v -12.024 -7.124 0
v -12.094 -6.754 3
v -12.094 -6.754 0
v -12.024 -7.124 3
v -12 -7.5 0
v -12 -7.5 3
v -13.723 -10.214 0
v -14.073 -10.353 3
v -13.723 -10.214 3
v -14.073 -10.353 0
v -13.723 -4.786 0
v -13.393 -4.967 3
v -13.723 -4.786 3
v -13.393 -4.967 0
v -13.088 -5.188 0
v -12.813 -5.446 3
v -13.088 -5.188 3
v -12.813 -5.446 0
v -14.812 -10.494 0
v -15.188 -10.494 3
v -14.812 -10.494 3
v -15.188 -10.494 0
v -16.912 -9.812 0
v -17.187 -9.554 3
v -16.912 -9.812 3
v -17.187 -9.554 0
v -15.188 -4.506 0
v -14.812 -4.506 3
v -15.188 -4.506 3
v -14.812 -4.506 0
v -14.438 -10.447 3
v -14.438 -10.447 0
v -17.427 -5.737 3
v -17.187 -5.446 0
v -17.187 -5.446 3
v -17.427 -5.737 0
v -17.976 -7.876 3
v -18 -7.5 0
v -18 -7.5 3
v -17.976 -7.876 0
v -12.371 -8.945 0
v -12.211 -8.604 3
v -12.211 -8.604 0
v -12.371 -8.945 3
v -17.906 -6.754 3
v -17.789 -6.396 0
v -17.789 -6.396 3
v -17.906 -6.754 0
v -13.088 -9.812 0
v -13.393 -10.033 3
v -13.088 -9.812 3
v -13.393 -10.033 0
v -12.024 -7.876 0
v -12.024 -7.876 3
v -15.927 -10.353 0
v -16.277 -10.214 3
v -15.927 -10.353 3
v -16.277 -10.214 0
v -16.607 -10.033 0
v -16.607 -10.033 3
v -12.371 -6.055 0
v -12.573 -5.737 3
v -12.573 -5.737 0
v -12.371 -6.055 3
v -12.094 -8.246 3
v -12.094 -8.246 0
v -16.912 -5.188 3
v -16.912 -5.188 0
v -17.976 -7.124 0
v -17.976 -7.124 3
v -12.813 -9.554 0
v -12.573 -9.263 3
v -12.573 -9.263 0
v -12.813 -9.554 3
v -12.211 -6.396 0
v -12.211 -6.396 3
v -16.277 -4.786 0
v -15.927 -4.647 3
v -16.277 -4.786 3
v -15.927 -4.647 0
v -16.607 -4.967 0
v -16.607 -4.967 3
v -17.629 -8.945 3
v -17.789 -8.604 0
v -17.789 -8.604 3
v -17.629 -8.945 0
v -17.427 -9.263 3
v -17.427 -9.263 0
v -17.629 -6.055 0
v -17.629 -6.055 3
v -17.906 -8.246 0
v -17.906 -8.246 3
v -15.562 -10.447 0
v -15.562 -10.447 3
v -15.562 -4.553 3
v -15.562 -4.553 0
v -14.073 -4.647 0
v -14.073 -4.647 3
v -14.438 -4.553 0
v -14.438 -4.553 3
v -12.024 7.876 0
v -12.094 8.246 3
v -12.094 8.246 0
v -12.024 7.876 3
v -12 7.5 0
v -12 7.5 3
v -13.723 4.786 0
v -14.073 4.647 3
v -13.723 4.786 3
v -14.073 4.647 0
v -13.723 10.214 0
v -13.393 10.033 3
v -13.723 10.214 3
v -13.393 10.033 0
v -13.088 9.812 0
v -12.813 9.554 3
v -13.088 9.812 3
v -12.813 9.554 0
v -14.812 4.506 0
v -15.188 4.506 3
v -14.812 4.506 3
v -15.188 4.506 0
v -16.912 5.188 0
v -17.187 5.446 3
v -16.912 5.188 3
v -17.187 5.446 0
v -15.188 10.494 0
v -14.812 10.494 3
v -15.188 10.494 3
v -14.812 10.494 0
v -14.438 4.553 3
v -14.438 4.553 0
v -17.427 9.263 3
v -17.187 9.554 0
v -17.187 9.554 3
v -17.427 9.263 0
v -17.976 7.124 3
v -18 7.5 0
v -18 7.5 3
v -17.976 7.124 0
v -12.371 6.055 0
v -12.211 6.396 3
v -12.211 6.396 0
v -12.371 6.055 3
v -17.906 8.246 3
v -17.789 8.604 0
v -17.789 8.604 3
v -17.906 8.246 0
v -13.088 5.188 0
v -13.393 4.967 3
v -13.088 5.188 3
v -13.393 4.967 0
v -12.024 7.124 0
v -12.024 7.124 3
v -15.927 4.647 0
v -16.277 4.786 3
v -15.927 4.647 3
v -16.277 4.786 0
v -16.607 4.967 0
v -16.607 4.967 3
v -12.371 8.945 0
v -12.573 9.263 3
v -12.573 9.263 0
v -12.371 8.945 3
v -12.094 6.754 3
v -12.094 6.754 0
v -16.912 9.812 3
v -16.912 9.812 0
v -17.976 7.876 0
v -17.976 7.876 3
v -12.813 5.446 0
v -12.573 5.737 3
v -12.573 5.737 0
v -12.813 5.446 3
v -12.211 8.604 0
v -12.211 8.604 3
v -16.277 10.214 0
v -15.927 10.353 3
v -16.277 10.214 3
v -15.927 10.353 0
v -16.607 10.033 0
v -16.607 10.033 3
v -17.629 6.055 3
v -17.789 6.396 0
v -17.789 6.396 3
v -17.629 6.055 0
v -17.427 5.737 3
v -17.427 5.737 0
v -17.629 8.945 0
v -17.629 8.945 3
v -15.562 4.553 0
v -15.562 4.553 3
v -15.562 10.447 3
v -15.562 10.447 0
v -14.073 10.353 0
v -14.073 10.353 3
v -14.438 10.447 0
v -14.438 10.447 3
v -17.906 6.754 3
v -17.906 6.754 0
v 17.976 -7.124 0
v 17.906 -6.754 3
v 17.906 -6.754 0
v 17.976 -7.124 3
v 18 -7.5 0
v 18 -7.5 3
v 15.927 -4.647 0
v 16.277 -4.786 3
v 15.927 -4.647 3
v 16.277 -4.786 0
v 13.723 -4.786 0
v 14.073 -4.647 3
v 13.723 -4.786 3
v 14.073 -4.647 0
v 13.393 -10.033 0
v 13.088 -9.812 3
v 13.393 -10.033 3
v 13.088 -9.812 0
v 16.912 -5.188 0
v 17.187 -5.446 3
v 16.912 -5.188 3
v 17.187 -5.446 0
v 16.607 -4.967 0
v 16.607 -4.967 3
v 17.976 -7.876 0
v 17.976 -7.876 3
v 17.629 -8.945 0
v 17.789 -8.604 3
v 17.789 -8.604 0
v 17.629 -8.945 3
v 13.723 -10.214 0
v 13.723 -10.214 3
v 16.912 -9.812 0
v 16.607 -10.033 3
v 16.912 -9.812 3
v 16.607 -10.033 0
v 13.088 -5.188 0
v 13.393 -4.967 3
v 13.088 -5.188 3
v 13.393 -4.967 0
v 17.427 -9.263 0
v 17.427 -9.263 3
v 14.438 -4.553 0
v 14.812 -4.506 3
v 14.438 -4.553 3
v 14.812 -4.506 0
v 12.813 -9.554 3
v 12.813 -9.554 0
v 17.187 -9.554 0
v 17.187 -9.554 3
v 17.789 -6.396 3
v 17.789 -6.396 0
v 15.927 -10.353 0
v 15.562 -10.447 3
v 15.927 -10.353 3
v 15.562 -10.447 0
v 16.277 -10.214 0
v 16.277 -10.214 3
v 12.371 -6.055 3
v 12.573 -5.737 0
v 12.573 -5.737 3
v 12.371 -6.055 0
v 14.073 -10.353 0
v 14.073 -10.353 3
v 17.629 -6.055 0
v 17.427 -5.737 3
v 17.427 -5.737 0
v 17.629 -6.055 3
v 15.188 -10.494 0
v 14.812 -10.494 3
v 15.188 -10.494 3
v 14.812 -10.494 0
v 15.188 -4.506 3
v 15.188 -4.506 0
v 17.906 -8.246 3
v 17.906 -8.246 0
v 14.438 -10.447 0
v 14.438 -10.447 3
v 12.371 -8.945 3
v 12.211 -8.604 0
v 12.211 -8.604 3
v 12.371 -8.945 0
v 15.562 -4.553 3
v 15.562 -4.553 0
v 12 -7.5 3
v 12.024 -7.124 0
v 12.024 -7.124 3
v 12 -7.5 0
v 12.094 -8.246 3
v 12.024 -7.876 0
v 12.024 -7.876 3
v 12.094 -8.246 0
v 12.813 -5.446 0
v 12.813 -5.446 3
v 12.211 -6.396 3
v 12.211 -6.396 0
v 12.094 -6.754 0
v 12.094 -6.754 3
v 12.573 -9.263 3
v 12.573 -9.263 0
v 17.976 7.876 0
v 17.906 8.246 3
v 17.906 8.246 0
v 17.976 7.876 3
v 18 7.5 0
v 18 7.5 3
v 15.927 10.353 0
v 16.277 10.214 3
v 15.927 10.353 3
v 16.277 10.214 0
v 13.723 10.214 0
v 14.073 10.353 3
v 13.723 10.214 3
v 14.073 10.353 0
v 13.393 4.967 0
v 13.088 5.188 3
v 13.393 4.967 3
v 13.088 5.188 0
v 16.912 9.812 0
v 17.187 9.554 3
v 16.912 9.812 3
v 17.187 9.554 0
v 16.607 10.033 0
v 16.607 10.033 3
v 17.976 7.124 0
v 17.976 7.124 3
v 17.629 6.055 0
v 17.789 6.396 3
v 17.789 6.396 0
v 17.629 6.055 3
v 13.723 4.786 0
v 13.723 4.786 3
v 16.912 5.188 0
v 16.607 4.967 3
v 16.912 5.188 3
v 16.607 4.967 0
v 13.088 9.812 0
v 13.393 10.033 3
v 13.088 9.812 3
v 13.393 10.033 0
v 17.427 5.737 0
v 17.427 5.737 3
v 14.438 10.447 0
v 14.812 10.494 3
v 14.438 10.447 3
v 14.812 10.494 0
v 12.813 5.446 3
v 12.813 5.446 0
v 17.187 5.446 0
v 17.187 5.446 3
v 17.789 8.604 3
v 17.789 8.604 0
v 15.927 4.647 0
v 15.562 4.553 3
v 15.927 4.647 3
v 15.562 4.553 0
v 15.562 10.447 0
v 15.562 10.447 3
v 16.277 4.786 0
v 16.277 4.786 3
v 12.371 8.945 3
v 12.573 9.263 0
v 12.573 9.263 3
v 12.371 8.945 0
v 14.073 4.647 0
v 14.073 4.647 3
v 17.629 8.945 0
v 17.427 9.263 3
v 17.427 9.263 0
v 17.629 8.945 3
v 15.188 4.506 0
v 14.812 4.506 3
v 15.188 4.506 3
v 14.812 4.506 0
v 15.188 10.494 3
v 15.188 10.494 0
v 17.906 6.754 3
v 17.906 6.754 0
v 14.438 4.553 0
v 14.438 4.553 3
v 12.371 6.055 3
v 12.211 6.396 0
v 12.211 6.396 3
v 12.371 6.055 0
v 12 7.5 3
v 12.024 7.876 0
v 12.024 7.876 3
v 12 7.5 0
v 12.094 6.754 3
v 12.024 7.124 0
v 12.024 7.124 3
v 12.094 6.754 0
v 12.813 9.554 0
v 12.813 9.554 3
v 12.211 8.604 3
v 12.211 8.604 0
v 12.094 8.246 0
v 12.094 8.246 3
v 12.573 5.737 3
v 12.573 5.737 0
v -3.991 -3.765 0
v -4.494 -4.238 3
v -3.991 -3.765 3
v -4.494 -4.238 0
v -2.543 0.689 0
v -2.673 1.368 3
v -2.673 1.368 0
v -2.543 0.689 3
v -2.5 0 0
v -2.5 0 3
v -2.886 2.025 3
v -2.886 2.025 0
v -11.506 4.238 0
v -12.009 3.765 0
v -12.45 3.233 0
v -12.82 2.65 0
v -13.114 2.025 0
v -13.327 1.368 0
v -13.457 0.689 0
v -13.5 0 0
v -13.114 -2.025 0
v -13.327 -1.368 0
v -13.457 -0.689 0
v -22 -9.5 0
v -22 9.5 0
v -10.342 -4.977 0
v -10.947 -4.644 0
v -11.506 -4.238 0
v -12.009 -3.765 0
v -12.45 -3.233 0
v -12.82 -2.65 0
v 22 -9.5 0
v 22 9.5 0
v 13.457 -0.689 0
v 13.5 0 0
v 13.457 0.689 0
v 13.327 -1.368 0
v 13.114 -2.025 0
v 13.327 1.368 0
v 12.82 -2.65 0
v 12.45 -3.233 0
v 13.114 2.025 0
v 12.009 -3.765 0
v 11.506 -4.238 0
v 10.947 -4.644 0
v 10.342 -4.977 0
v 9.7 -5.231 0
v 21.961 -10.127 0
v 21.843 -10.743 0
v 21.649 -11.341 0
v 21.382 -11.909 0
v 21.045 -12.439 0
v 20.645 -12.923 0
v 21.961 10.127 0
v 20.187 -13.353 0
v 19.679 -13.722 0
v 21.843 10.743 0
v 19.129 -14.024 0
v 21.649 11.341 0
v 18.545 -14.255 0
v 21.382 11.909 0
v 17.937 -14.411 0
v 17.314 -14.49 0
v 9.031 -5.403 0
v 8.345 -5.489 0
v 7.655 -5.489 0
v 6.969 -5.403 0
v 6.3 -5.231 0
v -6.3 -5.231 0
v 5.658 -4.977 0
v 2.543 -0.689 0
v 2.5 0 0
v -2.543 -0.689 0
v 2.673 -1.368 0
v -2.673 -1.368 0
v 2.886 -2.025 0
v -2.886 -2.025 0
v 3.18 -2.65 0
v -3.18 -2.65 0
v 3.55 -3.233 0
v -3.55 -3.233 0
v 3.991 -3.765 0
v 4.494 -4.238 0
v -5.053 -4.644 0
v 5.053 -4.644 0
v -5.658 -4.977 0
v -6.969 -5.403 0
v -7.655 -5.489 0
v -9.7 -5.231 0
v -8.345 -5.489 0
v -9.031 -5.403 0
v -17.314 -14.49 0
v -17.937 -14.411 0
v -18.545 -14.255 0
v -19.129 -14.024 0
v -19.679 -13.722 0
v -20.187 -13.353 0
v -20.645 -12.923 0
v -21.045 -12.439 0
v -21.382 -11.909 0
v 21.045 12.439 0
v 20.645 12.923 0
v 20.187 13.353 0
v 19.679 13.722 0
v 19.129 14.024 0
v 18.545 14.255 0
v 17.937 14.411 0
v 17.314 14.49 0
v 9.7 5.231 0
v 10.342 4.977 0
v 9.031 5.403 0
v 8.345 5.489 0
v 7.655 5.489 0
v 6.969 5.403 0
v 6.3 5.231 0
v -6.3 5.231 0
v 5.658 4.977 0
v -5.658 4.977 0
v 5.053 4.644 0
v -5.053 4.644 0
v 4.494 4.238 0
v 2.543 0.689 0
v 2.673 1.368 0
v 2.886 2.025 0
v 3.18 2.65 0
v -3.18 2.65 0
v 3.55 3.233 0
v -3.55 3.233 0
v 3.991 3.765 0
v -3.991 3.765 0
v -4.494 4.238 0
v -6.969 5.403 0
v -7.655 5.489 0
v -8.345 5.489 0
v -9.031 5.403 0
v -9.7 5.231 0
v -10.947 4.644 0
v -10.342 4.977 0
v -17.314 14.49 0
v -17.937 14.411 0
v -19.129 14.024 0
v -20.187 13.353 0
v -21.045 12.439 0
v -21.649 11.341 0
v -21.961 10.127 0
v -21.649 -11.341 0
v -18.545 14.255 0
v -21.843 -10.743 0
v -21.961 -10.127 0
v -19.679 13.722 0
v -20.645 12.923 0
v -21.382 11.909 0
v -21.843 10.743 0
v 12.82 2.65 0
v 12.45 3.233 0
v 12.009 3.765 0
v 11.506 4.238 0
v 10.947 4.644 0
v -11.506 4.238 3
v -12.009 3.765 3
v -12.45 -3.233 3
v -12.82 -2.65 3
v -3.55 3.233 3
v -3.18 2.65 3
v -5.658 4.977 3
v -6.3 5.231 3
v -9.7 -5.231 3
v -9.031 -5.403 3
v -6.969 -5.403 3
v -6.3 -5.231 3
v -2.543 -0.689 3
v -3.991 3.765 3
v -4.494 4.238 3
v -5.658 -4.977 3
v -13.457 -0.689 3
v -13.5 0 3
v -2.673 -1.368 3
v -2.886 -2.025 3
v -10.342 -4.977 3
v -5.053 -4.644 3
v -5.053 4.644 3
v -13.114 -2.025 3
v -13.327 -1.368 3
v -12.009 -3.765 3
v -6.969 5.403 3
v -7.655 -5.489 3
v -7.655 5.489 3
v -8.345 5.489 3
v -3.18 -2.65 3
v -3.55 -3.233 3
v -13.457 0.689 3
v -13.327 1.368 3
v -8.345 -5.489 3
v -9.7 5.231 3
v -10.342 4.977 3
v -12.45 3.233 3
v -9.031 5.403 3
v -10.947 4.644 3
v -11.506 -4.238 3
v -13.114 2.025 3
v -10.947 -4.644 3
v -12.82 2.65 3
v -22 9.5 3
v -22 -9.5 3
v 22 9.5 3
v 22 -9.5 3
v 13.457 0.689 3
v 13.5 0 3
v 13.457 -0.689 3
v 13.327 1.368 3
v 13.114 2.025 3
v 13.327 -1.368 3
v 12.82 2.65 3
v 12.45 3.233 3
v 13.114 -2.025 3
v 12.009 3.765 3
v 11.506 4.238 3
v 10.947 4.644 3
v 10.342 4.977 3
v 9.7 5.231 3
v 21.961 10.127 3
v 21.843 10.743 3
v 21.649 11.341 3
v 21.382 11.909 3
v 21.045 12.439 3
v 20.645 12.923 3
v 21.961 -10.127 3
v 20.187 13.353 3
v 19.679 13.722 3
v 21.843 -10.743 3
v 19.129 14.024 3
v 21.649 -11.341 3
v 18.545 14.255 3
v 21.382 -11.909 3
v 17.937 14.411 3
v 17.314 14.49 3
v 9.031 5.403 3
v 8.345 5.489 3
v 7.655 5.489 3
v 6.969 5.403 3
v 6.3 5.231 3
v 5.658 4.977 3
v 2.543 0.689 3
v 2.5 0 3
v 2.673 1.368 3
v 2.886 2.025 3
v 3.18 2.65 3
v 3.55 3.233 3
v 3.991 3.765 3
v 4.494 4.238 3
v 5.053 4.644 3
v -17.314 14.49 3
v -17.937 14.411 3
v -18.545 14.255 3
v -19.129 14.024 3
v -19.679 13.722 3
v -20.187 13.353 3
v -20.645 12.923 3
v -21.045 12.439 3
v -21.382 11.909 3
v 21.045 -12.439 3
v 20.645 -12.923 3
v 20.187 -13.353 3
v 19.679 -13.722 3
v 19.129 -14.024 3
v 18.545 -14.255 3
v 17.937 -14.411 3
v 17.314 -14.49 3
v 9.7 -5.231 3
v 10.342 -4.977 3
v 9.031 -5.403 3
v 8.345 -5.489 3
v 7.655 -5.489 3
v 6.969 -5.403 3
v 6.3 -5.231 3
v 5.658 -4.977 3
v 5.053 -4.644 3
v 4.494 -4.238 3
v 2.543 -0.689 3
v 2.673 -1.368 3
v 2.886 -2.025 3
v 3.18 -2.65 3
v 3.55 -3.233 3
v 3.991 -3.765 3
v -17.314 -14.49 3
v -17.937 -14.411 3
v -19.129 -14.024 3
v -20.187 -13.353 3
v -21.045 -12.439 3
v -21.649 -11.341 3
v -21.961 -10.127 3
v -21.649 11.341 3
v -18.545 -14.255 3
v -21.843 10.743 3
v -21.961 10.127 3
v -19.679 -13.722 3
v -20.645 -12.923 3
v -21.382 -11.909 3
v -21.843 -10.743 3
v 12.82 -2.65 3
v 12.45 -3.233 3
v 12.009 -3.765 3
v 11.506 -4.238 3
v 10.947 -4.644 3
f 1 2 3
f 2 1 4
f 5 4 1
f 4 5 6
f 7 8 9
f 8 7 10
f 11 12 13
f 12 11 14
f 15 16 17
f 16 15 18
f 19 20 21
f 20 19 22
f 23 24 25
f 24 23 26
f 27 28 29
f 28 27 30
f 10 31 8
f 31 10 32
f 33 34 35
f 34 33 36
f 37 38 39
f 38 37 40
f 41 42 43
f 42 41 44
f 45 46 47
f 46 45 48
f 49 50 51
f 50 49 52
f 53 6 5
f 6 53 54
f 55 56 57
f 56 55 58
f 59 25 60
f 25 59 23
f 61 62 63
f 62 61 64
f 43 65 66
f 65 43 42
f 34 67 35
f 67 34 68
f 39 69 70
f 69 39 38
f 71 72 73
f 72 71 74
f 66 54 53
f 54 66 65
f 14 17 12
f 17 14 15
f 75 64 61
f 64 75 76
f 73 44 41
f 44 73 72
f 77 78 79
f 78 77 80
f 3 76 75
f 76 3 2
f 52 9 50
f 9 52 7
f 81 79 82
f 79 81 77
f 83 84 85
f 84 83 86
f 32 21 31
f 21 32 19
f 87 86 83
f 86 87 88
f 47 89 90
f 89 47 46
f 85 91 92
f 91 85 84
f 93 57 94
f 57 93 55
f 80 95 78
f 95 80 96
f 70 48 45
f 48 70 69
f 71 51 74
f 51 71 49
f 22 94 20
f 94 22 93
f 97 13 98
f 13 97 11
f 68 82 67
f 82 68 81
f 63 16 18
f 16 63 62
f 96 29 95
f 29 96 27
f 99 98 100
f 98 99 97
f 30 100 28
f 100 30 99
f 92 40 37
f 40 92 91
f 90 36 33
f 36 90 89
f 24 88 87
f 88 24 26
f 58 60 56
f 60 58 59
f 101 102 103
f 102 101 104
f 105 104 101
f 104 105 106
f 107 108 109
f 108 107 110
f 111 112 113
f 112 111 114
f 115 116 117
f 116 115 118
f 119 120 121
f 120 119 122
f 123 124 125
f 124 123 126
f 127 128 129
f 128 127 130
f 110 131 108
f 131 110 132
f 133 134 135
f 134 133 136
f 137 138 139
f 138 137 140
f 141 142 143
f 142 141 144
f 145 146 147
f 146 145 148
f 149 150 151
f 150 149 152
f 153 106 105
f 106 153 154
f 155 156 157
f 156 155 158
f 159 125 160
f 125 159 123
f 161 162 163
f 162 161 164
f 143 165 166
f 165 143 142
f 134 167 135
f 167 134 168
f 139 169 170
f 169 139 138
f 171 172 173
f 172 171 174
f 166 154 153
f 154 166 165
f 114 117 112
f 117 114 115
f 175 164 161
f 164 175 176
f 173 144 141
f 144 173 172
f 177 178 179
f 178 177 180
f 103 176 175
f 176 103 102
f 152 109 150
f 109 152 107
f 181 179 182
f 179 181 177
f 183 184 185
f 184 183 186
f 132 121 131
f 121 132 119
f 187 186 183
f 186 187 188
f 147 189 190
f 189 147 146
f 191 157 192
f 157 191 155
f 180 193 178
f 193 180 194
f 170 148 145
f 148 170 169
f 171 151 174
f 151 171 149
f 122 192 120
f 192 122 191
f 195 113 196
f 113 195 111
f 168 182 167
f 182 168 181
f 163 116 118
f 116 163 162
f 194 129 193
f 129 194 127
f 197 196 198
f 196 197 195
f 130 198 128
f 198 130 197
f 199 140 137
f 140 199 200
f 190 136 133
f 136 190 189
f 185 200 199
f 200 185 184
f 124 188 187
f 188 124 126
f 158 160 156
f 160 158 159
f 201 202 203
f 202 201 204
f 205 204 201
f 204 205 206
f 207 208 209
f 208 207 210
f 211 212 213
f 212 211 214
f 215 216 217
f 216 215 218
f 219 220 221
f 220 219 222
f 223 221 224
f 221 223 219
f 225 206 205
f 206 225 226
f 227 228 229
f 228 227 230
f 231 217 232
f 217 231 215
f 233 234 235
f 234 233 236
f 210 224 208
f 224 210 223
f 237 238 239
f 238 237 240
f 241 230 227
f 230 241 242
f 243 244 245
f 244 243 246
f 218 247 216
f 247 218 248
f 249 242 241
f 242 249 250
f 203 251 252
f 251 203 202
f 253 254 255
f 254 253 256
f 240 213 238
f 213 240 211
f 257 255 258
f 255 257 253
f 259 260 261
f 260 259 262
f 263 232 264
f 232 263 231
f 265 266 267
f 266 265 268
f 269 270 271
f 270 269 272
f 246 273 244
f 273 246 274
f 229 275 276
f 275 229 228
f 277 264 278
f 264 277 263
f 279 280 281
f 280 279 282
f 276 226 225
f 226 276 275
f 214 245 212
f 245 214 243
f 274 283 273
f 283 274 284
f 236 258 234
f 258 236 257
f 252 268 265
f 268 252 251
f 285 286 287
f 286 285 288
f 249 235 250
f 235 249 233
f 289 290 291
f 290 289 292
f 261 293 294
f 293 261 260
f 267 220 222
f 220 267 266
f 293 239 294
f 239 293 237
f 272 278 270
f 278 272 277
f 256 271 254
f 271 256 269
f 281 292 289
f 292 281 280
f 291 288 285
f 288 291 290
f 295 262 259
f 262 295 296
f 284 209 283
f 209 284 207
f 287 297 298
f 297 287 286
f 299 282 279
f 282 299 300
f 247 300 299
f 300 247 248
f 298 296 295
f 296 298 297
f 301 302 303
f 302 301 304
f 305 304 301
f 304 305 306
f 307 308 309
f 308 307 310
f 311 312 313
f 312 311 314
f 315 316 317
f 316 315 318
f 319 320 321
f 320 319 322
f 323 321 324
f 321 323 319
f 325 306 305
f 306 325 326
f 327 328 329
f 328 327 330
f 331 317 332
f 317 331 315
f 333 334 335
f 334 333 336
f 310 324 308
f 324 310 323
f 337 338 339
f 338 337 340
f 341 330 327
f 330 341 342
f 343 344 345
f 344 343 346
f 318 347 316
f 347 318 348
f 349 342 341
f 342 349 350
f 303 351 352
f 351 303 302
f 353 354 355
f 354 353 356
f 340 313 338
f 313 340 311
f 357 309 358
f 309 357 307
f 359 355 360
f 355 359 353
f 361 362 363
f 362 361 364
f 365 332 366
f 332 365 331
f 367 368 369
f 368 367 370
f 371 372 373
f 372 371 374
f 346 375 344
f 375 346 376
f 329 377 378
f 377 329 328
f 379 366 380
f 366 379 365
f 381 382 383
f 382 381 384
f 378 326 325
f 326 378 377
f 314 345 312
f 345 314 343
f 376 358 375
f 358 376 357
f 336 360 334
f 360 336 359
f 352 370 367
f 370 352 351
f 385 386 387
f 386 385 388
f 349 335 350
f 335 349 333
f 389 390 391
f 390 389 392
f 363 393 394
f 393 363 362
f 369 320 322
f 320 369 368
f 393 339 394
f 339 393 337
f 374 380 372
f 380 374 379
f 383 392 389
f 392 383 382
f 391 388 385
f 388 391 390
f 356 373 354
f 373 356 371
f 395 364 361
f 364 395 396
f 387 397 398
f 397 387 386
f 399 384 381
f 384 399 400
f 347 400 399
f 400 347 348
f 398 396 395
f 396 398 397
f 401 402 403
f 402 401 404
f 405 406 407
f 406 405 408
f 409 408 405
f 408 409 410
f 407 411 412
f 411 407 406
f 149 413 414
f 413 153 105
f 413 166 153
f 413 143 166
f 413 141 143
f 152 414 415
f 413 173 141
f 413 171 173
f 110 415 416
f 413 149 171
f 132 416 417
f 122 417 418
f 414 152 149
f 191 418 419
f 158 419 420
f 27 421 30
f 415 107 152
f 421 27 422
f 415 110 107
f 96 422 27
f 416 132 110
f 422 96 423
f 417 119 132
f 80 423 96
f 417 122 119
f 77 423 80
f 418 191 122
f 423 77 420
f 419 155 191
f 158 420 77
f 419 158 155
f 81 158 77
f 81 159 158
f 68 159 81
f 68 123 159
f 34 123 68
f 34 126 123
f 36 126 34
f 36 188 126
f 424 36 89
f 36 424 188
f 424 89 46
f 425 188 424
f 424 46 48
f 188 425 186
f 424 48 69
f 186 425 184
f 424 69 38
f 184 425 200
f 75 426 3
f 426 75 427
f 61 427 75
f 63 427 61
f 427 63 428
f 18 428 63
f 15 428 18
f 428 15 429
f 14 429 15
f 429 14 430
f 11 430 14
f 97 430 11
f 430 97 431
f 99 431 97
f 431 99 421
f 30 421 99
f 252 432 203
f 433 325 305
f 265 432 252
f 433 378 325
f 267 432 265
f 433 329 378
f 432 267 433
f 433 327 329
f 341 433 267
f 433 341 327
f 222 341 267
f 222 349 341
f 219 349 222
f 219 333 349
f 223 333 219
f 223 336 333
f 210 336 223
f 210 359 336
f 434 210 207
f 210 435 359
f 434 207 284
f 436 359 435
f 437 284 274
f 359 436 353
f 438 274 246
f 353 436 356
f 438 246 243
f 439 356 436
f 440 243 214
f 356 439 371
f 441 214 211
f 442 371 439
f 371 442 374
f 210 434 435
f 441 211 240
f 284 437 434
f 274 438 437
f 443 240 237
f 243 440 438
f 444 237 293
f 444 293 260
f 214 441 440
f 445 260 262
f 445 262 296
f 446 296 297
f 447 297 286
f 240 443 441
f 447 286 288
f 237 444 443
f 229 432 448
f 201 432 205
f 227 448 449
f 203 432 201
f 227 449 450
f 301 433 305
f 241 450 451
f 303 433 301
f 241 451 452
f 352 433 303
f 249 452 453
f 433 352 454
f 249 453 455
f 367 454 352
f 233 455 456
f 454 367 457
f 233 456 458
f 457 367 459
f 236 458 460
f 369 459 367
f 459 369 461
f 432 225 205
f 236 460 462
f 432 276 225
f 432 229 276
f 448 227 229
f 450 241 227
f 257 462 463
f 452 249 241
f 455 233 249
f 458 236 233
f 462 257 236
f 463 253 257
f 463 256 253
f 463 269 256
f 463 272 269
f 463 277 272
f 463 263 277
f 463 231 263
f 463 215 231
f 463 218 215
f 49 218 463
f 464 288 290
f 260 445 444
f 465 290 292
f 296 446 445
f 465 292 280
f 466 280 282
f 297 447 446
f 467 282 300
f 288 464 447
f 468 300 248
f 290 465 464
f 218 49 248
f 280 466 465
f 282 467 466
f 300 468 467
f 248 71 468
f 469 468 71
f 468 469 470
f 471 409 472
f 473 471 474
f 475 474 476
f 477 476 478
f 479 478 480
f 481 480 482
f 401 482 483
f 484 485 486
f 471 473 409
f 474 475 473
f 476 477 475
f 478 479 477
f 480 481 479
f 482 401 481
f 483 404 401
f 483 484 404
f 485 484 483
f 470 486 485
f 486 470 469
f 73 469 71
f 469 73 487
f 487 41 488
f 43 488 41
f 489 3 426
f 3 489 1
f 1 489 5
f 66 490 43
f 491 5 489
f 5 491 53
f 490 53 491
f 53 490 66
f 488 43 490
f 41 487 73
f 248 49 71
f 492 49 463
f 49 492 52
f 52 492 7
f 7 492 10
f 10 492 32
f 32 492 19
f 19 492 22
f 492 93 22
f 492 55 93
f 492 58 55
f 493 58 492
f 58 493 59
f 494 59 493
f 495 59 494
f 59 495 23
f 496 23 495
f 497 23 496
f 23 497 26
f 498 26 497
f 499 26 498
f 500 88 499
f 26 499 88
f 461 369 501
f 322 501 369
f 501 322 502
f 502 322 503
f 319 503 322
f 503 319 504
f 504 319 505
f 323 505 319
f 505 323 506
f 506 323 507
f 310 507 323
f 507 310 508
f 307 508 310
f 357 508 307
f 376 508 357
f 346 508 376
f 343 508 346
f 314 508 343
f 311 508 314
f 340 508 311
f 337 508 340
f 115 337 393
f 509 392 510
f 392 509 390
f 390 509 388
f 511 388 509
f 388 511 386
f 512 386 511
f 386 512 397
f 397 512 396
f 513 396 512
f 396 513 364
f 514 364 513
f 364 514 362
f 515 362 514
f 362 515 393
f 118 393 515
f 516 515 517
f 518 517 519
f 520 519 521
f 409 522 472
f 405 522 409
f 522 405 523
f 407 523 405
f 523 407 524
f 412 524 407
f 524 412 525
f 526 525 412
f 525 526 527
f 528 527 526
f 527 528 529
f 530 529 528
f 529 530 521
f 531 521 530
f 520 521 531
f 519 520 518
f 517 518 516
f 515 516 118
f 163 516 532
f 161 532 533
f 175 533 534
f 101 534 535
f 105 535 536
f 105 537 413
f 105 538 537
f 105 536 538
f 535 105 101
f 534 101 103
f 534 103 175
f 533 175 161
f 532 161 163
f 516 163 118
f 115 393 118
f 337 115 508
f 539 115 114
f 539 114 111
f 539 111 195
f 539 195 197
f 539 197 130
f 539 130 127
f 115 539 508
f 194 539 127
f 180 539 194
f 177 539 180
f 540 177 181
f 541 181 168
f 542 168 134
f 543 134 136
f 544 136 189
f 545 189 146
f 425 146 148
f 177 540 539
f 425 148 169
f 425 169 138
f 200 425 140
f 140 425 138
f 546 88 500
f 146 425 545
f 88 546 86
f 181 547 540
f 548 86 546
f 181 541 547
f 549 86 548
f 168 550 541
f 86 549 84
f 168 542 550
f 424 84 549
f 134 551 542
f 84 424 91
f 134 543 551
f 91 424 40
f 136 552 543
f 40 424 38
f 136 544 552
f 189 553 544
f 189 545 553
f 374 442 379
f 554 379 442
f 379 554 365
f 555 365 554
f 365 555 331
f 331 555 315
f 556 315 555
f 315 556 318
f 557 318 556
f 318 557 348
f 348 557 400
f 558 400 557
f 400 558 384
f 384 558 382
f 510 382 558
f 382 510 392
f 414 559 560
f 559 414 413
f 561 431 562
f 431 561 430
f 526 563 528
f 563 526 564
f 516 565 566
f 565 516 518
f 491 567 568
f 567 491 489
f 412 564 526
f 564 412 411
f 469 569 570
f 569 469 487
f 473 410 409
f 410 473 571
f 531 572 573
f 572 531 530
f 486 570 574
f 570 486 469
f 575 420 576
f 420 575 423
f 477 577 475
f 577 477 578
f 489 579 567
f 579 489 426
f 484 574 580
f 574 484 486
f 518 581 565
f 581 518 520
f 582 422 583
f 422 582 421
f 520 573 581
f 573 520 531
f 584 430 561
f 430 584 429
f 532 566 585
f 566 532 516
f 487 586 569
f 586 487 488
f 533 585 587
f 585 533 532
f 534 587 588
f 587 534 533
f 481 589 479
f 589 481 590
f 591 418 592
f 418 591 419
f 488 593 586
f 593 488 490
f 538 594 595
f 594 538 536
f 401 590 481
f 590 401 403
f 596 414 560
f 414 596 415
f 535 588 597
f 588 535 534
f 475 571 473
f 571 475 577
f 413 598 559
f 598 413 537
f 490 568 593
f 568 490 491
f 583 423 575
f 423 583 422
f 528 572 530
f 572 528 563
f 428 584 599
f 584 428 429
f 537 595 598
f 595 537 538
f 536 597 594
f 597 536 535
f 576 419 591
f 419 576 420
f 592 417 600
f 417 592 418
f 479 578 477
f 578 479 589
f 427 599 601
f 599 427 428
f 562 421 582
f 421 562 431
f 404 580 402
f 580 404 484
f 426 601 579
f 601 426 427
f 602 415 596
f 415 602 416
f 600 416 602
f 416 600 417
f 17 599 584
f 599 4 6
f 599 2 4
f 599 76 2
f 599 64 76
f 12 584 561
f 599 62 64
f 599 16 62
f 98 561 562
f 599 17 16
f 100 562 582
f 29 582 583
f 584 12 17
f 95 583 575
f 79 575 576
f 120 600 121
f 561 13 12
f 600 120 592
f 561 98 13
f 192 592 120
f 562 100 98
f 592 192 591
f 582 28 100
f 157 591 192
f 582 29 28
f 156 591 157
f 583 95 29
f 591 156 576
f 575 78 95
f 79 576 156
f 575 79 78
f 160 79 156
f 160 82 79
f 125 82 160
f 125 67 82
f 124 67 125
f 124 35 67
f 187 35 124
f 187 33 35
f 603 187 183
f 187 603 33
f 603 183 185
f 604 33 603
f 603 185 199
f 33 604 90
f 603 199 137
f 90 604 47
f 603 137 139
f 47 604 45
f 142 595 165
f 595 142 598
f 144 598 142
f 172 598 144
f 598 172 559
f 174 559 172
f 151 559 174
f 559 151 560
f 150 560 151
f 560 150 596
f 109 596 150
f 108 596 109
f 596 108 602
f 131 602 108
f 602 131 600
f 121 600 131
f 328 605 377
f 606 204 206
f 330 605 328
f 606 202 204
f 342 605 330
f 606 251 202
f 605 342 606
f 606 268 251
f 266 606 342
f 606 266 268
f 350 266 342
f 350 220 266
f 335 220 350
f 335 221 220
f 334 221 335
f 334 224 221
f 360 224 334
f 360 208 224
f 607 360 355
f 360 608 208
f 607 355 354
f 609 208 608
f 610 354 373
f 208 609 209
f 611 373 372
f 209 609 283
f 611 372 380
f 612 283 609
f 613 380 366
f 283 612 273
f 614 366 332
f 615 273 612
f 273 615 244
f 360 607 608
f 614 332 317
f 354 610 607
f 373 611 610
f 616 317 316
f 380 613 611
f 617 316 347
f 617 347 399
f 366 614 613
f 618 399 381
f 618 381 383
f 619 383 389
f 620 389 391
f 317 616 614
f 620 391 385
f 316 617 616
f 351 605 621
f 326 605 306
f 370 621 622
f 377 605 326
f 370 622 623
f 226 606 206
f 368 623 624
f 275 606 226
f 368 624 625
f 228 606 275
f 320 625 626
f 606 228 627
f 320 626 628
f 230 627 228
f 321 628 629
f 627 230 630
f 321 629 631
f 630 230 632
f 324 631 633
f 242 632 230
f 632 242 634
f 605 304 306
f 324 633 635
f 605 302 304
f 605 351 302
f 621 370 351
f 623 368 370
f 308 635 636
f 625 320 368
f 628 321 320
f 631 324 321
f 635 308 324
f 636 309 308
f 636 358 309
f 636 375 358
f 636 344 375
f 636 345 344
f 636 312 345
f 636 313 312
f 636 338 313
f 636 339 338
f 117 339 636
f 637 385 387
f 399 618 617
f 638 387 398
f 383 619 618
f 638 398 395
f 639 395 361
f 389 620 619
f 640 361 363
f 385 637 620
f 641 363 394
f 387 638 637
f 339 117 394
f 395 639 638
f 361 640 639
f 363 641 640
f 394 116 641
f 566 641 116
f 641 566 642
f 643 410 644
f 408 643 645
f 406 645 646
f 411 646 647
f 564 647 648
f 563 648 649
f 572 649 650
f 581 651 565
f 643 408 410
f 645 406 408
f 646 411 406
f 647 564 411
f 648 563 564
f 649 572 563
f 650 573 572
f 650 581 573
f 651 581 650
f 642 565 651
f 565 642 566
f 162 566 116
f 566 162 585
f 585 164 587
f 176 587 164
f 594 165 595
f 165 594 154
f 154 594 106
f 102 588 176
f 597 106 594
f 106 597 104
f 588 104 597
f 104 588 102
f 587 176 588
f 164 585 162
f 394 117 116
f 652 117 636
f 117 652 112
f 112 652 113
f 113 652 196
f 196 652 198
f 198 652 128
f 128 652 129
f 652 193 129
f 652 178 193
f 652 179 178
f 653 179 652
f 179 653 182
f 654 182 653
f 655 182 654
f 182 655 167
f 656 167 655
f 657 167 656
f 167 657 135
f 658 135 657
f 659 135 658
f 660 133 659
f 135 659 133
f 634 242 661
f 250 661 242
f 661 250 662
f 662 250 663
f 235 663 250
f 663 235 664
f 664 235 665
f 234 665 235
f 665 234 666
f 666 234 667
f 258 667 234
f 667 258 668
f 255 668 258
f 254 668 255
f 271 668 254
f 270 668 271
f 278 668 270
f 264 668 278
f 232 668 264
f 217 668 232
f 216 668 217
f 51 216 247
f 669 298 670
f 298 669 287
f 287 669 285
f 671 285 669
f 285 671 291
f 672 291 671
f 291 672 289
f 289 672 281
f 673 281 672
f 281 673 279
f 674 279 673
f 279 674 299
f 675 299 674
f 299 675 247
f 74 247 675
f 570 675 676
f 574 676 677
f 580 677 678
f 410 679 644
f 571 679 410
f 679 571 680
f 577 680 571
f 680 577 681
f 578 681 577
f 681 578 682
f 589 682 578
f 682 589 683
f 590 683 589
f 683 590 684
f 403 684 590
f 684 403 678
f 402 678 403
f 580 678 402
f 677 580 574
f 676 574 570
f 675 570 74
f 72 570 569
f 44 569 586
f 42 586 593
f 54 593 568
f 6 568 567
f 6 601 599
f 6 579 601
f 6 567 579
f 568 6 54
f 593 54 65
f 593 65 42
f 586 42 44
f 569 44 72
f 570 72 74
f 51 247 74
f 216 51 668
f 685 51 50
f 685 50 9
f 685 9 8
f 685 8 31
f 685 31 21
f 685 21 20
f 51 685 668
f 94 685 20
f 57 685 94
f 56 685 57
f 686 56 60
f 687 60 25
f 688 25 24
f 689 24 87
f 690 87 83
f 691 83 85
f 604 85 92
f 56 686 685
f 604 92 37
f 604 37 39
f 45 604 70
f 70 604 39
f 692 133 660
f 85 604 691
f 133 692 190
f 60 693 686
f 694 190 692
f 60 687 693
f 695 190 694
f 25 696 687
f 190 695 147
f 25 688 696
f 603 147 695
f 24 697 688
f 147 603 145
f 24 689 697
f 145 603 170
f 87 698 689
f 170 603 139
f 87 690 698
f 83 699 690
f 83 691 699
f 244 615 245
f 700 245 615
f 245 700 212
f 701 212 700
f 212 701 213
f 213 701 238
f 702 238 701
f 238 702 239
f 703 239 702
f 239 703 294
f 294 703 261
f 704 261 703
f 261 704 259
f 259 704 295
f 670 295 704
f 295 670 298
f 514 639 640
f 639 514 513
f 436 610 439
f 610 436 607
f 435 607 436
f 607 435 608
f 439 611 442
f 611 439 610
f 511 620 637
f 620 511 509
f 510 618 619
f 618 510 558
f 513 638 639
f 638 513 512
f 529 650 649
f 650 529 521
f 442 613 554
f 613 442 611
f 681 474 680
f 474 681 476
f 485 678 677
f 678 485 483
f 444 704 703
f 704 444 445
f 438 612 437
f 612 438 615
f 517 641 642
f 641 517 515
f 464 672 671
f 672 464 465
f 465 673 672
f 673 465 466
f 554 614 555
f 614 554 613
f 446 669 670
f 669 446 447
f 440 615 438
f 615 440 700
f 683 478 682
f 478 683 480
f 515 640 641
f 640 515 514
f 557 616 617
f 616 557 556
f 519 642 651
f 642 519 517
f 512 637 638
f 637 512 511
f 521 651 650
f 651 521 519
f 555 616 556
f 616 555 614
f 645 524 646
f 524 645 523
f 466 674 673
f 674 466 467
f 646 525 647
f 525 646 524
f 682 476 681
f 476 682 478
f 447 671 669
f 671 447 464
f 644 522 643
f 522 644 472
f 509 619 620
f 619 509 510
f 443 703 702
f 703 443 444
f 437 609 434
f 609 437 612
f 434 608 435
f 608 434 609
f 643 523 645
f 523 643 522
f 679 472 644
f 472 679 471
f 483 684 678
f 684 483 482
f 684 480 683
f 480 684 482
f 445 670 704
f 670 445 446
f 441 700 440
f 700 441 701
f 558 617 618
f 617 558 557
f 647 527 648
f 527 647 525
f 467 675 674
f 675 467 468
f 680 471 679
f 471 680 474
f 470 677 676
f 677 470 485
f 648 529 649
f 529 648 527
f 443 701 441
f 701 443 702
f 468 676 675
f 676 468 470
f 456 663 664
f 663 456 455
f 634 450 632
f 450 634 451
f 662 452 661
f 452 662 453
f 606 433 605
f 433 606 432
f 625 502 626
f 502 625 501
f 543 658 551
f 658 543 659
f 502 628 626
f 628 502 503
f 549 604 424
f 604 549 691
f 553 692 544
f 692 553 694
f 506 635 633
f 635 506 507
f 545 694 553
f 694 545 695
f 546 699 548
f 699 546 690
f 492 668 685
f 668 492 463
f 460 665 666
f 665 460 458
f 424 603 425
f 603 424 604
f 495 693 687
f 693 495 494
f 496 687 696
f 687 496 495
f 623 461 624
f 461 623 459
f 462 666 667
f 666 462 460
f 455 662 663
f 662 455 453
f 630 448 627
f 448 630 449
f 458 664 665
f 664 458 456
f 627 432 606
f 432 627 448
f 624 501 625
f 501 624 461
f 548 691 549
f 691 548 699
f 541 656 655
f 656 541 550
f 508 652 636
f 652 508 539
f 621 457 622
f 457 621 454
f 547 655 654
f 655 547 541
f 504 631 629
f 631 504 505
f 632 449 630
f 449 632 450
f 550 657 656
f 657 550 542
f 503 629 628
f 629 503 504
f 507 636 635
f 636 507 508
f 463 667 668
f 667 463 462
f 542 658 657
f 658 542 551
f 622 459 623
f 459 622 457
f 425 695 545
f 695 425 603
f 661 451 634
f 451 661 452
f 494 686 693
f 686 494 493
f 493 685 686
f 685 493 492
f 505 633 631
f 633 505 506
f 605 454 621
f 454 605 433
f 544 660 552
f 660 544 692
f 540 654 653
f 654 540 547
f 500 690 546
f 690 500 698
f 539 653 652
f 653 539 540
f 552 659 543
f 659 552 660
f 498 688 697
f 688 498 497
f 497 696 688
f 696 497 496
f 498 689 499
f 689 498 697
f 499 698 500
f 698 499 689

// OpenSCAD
$fn = 50;


difference() {
	union() {
		hull() {
			translate(v = [-17.0000000000, 9.5000000000, 0]) {
				cylinder(h = 3, r = 5);
			}
			translate(v = [17.0000000000, 9.5000000000, 0]) {
				cylinder(h = 3, r = 5);
			}
			translate(v = [-17.0000000000, -9.5000000000, 0]) {
				cylinder(h = 3, r = 5);
			}
			translate(v = [17.0000000000, -9.5000000000, 0]) {
				cylinder(h = 3, r = 5);
			}
		}
	}
	union() {
		#translate(v = [-15.0000000000, -7.5000000000, -100.0000000000]) {
			cylinder(h = 200, r = 3.0000000000);
		}
		#translate(v = [-15.0000000000, 7.5000000000, -100.0000000000]) {
			cylinder(h = 200, r = 3.0000000000);
		}
		#translate(v = [15.0000000000, -7.5000000000, -100.0000000000]) {
			cylinder(h = 200, r = 3.0000000000);
		}
		#translate(v = [15.0000000000, 7.5000000000, -100.0000000000]) {
			cylinder(h = 200, r = 3.0000000000);
		}
		#translate(v = [-8.0000000000, 0, 0]) {
			cylinder(h = 3, r = 5.5000000000);
		}
		#translate(v = [8.0000000000, 0, 0]) {
			cylinder(h = 3, r = 5.5000000000);
		}
	}
}
